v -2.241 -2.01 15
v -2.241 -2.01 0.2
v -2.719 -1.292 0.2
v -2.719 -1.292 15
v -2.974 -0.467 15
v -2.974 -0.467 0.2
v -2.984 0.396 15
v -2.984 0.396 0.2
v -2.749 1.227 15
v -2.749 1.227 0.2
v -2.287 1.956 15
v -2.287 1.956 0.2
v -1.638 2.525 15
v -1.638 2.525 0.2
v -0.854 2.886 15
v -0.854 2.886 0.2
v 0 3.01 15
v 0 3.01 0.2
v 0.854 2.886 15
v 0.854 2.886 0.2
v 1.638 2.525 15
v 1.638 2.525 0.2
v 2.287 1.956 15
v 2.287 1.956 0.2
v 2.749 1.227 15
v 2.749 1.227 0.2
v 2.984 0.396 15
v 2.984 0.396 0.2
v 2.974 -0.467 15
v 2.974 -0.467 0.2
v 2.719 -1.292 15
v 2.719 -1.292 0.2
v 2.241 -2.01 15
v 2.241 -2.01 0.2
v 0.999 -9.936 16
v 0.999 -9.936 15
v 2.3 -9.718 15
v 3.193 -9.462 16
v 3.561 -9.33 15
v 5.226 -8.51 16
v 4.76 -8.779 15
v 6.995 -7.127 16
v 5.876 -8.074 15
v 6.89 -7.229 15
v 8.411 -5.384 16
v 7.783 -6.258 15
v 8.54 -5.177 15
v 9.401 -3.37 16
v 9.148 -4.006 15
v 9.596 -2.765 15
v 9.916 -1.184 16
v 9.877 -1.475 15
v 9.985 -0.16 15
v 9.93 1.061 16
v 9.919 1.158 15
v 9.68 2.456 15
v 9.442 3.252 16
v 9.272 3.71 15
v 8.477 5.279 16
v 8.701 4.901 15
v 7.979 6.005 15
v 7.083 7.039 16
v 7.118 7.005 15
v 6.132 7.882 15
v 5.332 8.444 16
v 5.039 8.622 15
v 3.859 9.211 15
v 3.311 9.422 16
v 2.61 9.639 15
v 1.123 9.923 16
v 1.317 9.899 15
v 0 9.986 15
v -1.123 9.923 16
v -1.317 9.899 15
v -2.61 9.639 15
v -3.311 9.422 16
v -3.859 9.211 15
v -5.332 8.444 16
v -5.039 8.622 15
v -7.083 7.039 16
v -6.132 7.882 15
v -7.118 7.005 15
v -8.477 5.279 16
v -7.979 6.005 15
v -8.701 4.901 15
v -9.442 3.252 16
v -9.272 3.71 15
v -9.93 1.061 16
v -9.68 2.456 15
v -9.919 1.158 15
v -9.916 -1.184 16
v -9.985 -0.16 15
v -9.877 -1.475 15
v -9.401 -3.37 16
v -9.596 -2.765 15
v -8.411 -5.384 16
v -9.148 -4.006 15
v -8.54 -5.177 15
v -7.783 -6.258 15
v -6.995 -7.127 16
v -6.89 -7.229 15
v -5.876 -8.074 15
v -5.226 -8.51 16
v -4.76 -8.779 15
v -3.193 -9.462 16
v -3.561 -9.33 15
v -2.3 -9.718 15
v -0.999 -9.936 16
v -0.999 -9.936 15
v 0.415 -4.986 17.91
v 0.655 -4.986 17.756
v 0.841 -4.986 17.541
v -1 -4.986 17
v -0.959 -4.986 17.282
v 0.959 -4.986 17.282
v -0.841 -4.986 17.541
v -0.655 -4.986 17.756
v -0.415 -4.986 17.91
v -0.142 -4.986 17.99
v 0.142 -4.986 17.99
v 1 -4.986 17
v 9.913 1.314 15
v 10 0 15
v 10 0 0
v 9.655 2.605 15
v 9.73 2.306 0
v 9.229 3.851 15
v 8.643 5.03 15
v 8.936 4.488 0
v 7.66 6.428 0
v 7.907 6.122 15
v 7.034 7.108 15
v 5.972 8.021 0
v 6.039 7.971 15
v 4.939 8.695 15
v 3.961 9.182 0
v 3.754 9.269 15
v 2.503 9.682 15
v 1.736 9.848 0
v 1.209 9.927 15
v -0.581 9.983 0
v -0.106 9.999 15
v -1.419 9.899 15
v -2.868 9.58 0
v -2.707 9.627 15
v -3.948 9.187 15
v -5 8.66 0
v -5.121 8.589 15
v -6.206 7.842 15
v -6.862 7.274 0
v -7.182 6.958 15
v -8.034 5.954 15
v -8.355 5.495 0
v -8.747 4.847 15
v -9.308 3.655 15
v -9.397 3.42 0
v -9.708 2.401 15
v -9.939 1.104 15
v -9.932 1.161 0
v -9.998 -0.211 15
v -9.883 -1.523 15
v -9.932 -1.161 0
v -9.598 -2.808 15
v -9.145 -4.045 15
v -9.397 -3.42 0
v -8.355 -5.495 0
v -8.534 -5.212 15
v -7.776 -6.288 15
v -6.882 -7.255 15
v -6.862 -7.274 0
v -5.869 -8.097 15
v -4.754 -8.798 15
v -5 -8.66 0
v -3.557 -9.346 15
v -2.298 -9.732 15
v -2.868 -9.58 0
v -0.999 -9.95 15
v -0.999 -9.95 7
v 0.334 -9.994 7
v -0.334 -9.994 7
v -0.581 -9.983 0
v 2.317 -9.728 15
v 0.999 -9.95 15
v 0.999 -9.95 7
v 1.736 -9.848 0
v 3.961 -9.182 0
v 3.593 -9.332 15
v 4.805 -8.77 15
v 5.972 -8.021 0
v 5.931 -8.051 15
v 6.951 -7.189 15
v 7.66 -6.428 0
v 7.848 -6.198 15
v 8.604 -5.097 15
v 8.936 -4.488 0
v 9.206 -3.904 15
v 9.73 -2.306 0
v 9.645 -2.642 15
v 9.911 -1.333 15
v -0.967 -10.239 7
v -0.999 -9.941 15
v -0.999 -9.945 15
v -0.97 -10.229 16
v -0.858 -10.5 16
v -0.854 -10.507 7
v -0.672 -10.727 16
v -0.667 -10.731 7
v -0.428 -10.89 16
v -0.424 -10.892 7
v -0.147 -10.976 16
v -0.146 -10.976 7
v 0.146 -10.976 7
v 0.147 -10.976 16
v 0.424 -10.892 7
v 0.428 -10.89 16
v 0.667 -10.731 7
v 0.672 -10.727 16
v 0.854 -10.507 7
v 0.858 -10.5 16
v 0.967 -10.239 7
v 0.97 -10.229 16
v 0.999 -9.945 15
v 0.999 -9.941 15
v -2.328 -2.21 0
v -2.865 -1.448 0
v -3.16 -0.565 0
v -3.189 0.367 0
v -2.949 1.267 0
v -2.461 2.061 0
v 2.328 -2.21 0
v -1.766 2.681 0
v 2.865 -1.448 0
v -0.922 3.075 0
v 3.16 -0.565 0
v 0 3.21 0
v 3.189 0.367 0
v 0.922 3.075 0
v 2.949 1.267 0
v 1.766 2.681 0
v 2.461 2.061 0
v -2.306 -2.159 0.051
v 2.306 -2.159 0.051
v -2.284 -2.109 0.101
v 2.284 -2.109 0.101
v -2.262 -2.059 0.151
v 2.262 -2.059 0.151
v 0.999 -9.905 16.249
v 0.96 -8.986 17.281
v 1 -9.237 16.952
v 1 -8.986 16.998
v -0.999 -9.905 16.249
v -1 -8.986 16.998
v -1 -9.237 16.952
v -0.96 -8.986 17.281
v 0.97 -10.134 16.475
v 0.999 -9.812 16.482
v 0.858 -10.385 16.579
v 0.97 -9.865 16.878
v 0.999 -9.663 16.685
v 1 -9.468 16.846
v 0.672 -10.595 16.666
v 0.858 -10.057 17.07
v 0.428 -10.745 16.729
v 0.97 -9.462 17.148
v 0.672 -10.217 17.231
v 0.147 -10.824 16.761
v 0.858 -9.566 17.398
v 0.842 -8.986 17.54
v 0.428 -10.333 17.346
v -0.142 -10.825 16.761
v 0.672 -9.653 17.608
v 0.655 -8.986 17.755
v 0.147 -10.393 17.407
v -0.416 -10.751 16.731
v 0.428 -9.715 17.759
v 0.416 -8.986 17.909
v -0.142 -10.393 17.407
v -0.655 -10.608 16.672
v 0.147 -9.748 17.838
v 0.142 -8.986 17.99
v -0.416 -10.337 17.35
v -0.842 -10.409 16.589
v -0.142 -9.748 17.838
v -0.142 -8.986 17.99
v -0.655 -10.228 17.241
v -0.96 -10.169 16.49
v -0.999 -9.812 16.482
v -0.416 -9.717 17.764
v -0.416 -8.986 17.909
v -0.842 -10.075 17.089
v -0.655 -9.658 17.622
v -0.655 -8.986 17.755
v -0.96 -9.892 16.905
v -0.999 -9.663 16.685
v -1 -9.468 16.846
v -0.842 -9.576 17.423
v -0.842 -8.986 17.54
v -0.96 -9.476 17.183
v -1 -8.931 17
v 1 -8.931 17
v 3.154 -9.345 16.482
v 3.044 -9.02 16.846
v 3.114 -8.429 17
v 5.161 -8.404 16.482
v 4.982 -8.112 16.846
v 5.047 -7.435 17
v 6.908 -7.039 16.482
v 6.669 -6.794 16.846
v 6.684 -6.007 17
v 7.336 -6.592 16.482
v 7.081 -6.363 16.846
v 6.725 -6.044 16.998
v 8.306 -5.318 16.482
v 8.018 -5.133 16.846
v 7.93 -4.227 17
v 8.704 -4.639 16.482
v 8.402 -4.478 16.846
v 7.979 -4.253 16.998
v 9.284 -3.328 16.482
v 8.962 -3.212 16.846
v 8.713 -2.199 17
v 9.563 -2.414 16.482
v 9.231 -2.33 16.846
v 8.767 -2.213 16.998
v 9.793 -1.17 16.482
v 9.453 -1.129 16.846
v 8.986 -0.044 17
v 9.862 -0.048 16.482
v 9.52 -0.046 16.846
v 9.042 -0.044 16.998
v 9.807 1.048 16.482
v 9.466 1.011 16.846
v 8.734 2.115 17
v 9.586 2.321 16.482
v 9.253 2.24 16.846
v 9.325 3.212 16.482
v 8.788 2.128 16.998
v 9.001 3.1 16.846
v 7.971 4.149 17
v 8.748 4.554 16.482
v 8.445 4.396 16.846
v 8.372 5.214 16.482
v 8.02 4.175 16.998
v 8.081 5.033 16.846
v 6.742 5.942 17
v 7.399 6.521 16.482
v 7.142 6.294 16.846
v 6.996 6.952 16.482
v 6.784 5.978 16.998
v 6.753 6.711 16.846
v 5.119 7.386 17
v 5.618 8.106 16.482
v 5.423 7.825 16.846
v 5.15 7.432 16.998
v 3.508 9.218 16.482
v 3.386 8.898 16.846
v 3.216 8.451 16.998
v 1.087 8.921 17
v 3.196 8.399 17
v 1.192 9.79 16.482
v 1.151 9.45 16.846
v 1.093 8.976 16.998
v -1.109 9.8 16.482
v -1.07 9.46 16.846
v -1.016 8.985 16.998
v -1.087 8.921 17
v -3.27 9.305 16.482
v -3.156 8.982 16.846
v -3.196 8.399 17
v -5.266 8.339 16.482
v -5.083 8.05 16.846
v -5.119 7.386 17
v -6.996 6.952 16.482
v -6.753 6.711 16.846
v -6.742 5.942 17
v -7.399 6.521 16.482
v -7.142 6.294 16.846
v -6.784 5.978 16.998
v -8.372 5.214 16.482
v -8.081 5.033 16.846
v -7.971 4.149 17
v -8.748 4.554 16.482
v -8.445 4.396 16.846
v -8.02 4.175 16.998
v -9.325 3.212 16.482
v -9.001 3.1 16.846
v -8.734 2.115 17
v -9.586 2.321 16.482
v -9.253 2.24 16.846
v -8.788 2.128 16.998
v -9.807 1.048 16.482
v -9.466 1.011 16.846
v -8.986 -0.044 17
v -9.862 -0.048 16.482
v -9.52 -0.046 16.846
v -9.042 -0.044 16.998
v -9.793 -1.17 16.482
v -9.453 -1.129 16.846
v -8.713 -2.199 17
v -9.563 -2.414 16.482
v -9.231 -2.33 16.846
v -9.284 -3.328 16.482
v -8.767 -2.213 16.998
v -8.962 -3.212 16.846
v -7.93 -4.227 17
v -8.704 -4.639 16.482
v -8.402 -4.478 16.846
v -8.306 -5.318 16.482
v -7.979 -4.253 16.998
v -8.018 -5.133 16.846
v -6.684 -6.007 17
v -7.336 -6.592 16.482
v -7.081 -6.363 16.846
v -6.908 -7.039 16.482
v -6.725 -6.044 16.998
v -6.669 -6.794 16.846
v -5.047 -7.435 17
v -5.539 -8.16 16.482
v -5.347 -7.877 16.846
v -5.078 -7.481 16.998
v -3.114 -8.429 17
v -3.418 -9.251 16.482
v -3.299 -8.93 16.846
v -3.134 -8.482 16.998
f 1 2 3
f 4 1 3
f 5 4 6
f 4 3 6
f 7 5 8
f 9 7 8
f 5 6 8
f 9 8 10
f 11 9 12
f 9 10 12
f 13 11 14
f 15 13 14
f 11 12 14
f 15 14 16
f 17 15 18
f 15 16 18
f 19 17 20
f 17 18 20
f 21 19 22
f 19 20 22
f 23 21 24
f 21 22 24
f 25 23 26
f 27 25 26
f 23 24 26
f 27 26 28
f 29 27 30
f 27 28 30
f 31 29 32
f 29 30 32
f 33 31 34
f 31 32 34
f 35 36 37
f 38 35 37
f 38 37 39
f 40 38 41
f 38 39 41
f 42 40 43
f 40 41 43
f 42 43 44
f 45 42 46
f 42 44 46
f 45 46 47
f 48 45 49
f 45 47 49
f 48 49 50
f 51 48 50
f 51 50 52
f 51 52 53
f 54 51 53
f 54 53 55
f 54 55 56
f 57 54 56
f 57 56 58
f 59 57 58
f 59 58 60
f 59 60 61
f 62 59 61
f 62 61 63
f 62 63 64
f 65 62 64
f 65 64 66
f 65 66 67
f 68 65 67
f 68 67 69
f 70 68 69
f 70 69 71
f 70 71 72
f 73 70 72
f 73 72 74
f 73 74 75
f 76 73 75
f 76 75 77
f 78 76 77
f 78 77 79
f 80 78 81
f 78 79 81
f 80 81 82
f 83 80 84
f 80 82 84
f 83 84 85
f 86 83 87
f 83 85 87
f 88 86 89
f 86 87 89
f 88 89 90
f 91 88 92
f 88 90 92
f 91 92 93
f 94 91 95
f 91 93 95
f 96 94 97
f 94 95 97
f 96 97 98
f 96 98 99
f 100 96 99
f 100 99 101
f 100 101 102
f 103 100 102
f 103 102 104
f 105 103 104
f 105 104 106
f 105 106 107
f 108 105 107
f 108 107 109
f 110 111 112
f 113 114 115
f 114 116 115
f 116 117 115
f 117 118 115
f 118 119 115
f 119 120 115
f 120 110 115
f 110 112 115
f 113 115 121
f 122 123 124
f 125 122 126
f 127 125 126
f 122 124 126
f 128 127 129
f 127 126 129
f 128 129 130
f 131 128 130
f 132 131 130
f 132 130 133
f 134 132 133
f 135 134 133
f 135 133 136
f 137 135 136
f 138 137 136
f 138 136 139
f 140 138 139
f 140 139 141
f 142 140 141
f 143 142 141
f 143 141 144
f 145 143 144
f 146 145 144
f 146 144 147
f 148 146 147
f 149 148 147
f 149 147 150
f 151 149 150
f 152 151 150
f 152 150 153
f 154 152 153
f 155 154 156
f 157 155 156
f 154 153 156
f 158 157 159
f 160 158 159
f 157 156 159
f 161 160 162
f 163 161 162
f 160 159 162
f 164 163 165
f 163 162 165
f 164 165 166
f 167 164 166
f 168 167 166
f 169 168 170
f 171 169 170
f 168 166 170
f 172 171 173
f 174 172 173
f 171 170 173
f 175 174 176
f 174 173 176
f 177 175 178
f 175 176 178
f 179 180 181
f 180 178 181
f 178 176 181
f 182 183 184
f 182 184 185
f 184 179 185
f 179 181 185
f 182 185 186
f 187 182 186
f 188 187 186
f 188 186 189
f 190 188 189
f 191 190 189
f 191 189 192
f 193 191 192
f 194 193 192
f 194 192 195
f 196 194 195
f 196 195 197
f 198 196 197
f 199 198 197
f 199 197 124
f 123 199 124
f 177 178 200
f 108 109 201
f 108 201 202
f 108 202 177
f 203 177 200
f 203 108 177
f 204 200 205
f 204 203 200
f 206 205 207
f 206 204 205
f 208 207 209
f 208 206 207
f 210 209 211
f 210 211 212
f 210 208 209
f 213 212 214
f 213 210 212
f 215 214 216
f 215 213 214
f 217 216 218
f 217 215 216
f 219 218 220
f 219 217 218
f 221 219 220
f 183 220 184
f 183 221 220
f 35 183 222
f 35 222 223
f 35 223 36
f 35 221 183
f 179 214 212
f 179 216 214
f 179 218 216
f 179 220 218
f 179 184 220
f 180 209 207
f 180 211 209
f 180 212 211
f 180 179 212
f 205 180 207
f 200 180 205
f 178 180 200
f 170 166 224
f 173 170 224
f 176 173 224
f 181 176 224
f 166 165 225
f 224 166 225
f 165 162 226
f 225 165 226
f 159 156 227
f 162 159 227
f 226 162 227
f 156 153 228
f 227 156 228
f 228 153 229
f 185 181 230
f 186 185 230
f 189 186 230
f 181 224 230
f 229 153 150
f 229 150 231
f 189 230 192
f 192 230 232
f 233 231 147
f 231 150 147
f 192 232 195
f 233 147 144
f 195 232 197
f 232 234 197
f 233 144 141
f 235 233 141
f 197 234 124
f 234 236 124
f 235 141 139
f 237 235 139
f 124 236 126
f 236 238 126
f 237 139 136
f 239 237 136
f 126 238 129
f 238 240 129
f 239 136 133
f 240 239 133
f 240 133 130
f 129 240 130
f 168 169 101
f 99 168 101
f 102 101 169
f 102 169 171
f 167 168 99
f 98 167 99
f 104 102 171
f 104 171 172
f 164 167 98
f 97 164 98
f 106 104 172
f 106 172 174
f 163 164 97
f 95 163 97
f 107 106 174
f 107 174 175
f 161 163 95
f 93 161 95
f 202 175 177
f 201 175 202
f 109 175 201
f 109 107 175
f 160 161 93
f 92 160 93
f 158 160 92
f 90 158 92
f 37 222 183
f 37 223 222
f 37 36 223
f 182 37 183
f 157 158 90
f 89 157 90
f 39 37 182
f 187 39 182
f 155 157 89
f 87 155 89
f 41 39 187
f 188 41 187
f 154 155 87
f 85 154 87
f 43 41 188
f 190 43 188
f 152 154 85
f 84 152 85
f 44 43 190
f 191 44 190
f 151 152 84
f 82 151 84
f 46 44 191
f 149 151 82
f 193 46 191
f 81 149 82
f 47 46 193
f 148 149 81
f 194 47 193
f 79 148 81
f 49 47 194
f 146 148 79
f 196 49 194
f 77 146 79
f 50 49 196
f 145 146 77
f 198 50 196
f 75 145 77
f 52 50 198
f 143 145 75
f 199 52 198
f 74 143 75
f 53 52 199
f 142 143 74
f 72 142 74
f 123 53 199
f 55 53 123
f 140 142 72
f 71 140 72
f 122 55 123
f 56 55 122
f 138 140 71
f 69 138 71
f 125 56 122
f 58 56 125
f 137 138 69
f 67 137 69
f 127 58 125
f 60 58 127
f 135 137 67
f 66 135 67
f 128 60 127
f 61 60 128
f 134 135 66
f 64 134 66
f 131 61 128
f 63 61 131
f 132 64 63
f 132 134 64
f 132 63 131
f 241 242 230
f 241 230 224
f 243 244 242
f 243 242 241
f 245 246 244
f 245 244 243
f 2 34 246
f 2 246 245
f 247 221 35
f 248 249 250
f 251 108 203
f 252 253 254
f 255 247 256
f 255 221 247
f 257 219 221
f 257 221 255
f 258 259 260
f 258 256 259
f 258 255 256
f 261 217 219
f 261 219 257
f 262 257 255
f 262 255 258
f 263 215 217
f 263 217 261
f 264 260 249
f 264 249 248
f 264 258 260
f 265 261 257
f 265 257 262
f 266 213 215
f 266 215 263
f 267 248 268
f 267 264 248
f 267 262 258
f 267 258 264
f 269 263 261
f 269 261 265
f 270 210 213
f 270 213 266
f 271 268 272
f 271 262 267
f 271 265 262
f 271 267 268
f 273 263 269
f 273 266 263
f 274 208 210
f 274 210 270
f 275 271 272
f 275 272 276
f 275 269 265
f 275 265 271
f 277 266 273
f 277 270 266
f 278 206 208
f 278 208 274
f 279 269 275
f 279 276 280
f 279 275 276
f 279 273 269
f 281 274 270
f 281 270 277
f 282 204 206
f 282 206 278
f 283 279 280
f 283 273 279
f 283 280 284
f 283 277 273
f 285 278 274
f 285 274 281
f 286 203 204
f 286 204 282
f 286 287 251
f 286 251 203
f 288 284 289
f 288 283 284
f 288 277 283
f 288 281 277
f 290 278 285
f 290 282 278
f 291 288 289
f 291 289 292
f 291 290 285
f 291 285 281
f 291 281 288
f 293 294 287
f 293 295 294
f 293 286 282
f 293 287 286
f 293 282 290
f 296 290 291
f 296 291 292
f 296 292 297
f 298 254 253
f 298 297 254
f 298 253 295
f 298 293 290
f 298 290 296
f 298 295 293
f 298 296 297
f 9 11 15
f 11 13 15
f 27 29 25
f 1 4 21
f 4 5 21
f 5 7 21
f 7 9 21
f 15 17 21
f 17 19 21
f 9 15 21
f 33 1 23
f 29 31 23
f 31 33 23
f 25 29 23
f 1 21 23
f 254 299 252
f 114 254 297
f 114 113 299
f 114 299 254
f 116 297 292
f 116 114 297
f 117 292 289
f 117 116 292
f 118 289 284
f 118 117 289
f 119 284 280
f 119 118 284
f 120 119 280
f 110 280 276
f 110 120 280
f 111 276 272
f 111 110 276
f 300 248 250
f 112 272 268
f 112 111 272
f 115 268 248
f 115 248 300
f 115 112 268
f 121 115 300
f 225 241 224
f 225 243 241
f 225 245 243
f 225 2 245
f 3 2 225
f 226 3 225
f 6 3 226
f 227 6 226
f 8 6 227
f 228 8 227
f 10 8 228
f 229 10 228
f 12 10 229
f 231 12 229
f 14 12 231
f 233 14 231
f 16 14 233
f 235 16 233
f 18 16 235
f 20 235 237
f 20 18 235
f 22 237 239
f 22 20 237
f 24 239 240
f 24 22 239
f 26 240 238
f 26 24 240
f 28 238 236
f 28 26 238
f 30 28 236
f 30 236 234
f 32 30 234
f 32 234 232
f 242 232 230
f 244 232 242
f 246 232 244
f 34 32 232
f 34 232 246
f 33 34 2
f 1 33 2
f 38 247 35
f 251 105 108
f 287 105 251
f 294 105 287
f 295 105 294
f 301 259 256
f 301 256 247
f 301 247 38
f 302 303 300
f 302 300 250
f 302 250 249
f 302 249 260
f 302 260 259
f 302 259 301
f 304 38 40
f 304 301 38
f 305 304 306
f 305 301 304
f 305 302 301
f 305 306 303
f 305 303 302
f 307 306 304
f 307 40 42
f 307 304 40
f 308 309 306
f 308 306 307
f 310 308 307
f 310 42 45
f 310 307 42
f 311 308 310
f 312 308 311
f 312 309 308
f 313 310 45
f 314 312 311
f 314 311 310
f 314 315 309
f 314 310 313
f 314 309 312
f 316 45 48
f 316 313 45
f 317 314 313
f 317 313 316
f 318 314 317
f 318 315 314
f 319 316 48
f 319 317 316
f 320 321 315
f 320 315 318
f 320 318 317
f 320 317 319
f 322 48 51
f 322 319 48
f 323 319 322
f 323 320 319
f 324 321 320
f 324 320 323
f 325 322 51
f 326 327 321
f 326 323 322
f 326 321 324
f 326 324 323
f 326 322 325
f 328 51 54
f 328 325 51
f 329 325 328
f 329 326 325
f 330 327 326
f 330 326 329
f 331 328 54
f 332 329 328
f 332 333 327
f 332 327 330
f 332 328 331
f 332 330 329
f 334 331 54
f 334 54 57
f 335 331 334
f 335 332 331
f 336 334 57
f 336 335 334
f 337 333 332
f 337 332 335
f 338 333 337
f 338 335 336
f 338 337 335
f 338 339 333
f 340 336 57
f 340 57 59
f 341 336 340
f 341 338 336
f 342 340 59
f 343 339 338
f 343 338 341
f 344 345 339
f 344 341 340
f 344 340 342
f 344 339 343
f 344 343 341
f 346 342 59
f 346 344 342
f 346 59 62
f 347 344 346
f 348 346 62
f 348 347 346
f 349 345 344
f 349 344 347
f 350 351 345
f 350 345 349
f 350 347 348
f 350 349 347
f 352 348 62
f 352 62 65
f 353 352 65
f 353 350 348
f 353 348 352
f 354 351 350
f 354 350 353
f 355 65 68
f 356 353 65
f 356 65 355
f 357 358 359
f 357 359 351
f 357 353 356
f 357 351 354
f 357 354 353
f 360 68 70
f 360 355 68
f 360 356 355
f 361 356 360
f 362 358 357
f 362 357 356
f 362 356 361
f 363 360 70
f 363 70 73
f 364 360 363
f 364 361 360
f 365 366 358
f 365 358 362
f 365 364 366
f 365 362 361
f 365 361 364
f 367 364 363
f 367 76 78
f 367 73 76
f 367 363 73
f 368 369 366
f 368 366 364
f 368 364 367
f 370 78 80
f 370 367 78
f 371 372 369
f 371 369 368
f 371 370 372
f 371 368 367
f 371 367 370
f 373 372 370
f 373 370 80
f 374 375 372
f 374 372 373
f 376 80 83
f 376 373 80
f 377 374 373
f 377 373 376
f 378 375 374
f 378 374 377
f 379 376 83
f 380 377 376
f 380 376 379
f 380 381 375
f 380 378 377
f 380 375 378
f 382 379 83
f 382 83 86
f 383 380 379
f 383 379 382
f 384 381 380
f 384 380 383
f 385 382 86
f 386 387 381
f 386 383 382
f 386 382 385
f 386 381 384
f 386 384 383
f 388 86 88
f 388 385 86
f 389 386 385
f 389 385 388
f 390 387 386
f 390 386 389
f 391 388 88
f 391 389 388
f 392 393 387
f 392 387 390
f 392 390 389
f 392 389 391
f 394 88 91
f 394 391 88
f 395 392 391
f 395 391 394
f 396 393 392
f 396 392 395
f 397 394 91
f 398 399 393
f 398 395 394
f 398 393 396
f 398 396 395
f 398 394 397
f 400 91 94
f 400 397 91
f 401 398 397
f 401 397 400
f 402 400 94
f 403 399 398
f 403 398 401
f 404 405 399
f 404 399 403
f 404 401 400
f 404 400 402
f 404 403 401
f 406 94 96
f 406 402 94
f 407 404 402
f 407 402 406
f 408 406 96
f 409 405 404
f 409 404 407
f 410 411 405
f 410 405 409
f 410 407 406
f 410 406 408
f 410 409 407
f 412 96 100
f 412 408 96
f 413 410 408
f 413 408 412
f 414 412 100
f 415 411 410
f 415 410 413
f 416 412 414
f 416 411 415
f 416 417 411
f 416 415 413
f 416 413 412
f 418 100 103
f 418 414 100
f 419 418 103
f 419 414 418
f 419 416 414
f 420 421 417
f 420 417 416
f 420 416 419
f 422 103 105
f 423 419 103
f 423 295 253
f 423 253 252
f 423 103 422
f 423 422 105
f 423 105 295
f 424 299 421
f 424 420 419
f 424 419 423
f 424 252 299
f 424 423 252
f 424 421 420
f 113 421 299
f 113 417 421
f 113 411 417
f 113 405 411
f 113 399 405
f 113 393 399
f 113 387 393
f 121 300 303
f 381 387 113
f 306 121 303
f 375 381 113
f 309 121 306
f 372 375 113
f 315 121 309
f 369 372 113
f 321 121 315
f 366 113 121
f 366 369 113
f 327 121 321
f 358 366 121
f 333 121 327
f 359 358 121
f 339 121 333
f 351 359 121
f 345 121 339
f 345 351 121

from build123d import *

# Parameters (mm, degrees)
F0_R     = 10
F1_DEPTH = 15
F2_R     = 9.9864299767
F9_DEPTH = 2
F3_R     = 1
F4_SIZE  = 0.2
F7_R     = 1


with BuildPart() as f1:
    # F0 (on Top) → F1 (new body)
    with BuildSketch(Plane.XY):
        Circle(F0_R)
        with BuildLine():
            ThreePointArc((-2.2405356502, -2.01), (0, 3.01), (2.2405356502, -2.01))
            Line((2.2405356502, -2.01), (-2.2405356502, -2.01))
        make_face(mode=Mode.SUBTRACT)
    extrude(amount=F1_DEPTH)

    # F2 (on face) → F9 (join)
    with BuildSketch(Plane.XY.offset(15)):
        Circle(F2_R)
        with BuildLine():
            Line((2.2405356502, -2.01), (-2.2405356502, -2.01))
            ThreePointArc((-2.2405356502, -2.01), (0, 3.01), (2.2405356502, -2.01))
        make_face(mode=Mode.SUBTRACT)
        Circle(F2_R)
    extrude(amount=F9_DEPTH)

    # F3
    f3_edges = [f1.edges().sort_by_distance(p)[0] for p in [
        (-9.98643, 0, 17),
    ]]
    fillet(f3_edges, radius=F3_R)

    # F4
    f4_edges = [f1.edges().sort_by_distance(p)[0] for p in [
        (0, 3.01, 0),
        (0, -2.01, 0),
    ]]
    chamfer(f4_edges, length=F4_SIZE)

    # F8: sweep along a path in F5
    with BuildLine(Plane.YZ) as f8_path:
        Line((-9.9864299767, 7), (-9.9864299767, 16))
        ThreePointArc((-9.9864299767, 16), (-9.6935367579, 16.7071067812), (-8.9864299767, 17))
        Line((-8.9864299767, 17), (-4.9864299767, 17))
    # F7 (on line) → F8 (sweep)
    with BuildSketch(Plane(origin=(0, 0, 7), x_dir=(1, 0, 0), z_dir=(0, 0, -1))):
        with Locations((0, 9.9864299767)):
            Circle(F7_R)
    sweep(path=f8_path.line)


solid = f1.part
